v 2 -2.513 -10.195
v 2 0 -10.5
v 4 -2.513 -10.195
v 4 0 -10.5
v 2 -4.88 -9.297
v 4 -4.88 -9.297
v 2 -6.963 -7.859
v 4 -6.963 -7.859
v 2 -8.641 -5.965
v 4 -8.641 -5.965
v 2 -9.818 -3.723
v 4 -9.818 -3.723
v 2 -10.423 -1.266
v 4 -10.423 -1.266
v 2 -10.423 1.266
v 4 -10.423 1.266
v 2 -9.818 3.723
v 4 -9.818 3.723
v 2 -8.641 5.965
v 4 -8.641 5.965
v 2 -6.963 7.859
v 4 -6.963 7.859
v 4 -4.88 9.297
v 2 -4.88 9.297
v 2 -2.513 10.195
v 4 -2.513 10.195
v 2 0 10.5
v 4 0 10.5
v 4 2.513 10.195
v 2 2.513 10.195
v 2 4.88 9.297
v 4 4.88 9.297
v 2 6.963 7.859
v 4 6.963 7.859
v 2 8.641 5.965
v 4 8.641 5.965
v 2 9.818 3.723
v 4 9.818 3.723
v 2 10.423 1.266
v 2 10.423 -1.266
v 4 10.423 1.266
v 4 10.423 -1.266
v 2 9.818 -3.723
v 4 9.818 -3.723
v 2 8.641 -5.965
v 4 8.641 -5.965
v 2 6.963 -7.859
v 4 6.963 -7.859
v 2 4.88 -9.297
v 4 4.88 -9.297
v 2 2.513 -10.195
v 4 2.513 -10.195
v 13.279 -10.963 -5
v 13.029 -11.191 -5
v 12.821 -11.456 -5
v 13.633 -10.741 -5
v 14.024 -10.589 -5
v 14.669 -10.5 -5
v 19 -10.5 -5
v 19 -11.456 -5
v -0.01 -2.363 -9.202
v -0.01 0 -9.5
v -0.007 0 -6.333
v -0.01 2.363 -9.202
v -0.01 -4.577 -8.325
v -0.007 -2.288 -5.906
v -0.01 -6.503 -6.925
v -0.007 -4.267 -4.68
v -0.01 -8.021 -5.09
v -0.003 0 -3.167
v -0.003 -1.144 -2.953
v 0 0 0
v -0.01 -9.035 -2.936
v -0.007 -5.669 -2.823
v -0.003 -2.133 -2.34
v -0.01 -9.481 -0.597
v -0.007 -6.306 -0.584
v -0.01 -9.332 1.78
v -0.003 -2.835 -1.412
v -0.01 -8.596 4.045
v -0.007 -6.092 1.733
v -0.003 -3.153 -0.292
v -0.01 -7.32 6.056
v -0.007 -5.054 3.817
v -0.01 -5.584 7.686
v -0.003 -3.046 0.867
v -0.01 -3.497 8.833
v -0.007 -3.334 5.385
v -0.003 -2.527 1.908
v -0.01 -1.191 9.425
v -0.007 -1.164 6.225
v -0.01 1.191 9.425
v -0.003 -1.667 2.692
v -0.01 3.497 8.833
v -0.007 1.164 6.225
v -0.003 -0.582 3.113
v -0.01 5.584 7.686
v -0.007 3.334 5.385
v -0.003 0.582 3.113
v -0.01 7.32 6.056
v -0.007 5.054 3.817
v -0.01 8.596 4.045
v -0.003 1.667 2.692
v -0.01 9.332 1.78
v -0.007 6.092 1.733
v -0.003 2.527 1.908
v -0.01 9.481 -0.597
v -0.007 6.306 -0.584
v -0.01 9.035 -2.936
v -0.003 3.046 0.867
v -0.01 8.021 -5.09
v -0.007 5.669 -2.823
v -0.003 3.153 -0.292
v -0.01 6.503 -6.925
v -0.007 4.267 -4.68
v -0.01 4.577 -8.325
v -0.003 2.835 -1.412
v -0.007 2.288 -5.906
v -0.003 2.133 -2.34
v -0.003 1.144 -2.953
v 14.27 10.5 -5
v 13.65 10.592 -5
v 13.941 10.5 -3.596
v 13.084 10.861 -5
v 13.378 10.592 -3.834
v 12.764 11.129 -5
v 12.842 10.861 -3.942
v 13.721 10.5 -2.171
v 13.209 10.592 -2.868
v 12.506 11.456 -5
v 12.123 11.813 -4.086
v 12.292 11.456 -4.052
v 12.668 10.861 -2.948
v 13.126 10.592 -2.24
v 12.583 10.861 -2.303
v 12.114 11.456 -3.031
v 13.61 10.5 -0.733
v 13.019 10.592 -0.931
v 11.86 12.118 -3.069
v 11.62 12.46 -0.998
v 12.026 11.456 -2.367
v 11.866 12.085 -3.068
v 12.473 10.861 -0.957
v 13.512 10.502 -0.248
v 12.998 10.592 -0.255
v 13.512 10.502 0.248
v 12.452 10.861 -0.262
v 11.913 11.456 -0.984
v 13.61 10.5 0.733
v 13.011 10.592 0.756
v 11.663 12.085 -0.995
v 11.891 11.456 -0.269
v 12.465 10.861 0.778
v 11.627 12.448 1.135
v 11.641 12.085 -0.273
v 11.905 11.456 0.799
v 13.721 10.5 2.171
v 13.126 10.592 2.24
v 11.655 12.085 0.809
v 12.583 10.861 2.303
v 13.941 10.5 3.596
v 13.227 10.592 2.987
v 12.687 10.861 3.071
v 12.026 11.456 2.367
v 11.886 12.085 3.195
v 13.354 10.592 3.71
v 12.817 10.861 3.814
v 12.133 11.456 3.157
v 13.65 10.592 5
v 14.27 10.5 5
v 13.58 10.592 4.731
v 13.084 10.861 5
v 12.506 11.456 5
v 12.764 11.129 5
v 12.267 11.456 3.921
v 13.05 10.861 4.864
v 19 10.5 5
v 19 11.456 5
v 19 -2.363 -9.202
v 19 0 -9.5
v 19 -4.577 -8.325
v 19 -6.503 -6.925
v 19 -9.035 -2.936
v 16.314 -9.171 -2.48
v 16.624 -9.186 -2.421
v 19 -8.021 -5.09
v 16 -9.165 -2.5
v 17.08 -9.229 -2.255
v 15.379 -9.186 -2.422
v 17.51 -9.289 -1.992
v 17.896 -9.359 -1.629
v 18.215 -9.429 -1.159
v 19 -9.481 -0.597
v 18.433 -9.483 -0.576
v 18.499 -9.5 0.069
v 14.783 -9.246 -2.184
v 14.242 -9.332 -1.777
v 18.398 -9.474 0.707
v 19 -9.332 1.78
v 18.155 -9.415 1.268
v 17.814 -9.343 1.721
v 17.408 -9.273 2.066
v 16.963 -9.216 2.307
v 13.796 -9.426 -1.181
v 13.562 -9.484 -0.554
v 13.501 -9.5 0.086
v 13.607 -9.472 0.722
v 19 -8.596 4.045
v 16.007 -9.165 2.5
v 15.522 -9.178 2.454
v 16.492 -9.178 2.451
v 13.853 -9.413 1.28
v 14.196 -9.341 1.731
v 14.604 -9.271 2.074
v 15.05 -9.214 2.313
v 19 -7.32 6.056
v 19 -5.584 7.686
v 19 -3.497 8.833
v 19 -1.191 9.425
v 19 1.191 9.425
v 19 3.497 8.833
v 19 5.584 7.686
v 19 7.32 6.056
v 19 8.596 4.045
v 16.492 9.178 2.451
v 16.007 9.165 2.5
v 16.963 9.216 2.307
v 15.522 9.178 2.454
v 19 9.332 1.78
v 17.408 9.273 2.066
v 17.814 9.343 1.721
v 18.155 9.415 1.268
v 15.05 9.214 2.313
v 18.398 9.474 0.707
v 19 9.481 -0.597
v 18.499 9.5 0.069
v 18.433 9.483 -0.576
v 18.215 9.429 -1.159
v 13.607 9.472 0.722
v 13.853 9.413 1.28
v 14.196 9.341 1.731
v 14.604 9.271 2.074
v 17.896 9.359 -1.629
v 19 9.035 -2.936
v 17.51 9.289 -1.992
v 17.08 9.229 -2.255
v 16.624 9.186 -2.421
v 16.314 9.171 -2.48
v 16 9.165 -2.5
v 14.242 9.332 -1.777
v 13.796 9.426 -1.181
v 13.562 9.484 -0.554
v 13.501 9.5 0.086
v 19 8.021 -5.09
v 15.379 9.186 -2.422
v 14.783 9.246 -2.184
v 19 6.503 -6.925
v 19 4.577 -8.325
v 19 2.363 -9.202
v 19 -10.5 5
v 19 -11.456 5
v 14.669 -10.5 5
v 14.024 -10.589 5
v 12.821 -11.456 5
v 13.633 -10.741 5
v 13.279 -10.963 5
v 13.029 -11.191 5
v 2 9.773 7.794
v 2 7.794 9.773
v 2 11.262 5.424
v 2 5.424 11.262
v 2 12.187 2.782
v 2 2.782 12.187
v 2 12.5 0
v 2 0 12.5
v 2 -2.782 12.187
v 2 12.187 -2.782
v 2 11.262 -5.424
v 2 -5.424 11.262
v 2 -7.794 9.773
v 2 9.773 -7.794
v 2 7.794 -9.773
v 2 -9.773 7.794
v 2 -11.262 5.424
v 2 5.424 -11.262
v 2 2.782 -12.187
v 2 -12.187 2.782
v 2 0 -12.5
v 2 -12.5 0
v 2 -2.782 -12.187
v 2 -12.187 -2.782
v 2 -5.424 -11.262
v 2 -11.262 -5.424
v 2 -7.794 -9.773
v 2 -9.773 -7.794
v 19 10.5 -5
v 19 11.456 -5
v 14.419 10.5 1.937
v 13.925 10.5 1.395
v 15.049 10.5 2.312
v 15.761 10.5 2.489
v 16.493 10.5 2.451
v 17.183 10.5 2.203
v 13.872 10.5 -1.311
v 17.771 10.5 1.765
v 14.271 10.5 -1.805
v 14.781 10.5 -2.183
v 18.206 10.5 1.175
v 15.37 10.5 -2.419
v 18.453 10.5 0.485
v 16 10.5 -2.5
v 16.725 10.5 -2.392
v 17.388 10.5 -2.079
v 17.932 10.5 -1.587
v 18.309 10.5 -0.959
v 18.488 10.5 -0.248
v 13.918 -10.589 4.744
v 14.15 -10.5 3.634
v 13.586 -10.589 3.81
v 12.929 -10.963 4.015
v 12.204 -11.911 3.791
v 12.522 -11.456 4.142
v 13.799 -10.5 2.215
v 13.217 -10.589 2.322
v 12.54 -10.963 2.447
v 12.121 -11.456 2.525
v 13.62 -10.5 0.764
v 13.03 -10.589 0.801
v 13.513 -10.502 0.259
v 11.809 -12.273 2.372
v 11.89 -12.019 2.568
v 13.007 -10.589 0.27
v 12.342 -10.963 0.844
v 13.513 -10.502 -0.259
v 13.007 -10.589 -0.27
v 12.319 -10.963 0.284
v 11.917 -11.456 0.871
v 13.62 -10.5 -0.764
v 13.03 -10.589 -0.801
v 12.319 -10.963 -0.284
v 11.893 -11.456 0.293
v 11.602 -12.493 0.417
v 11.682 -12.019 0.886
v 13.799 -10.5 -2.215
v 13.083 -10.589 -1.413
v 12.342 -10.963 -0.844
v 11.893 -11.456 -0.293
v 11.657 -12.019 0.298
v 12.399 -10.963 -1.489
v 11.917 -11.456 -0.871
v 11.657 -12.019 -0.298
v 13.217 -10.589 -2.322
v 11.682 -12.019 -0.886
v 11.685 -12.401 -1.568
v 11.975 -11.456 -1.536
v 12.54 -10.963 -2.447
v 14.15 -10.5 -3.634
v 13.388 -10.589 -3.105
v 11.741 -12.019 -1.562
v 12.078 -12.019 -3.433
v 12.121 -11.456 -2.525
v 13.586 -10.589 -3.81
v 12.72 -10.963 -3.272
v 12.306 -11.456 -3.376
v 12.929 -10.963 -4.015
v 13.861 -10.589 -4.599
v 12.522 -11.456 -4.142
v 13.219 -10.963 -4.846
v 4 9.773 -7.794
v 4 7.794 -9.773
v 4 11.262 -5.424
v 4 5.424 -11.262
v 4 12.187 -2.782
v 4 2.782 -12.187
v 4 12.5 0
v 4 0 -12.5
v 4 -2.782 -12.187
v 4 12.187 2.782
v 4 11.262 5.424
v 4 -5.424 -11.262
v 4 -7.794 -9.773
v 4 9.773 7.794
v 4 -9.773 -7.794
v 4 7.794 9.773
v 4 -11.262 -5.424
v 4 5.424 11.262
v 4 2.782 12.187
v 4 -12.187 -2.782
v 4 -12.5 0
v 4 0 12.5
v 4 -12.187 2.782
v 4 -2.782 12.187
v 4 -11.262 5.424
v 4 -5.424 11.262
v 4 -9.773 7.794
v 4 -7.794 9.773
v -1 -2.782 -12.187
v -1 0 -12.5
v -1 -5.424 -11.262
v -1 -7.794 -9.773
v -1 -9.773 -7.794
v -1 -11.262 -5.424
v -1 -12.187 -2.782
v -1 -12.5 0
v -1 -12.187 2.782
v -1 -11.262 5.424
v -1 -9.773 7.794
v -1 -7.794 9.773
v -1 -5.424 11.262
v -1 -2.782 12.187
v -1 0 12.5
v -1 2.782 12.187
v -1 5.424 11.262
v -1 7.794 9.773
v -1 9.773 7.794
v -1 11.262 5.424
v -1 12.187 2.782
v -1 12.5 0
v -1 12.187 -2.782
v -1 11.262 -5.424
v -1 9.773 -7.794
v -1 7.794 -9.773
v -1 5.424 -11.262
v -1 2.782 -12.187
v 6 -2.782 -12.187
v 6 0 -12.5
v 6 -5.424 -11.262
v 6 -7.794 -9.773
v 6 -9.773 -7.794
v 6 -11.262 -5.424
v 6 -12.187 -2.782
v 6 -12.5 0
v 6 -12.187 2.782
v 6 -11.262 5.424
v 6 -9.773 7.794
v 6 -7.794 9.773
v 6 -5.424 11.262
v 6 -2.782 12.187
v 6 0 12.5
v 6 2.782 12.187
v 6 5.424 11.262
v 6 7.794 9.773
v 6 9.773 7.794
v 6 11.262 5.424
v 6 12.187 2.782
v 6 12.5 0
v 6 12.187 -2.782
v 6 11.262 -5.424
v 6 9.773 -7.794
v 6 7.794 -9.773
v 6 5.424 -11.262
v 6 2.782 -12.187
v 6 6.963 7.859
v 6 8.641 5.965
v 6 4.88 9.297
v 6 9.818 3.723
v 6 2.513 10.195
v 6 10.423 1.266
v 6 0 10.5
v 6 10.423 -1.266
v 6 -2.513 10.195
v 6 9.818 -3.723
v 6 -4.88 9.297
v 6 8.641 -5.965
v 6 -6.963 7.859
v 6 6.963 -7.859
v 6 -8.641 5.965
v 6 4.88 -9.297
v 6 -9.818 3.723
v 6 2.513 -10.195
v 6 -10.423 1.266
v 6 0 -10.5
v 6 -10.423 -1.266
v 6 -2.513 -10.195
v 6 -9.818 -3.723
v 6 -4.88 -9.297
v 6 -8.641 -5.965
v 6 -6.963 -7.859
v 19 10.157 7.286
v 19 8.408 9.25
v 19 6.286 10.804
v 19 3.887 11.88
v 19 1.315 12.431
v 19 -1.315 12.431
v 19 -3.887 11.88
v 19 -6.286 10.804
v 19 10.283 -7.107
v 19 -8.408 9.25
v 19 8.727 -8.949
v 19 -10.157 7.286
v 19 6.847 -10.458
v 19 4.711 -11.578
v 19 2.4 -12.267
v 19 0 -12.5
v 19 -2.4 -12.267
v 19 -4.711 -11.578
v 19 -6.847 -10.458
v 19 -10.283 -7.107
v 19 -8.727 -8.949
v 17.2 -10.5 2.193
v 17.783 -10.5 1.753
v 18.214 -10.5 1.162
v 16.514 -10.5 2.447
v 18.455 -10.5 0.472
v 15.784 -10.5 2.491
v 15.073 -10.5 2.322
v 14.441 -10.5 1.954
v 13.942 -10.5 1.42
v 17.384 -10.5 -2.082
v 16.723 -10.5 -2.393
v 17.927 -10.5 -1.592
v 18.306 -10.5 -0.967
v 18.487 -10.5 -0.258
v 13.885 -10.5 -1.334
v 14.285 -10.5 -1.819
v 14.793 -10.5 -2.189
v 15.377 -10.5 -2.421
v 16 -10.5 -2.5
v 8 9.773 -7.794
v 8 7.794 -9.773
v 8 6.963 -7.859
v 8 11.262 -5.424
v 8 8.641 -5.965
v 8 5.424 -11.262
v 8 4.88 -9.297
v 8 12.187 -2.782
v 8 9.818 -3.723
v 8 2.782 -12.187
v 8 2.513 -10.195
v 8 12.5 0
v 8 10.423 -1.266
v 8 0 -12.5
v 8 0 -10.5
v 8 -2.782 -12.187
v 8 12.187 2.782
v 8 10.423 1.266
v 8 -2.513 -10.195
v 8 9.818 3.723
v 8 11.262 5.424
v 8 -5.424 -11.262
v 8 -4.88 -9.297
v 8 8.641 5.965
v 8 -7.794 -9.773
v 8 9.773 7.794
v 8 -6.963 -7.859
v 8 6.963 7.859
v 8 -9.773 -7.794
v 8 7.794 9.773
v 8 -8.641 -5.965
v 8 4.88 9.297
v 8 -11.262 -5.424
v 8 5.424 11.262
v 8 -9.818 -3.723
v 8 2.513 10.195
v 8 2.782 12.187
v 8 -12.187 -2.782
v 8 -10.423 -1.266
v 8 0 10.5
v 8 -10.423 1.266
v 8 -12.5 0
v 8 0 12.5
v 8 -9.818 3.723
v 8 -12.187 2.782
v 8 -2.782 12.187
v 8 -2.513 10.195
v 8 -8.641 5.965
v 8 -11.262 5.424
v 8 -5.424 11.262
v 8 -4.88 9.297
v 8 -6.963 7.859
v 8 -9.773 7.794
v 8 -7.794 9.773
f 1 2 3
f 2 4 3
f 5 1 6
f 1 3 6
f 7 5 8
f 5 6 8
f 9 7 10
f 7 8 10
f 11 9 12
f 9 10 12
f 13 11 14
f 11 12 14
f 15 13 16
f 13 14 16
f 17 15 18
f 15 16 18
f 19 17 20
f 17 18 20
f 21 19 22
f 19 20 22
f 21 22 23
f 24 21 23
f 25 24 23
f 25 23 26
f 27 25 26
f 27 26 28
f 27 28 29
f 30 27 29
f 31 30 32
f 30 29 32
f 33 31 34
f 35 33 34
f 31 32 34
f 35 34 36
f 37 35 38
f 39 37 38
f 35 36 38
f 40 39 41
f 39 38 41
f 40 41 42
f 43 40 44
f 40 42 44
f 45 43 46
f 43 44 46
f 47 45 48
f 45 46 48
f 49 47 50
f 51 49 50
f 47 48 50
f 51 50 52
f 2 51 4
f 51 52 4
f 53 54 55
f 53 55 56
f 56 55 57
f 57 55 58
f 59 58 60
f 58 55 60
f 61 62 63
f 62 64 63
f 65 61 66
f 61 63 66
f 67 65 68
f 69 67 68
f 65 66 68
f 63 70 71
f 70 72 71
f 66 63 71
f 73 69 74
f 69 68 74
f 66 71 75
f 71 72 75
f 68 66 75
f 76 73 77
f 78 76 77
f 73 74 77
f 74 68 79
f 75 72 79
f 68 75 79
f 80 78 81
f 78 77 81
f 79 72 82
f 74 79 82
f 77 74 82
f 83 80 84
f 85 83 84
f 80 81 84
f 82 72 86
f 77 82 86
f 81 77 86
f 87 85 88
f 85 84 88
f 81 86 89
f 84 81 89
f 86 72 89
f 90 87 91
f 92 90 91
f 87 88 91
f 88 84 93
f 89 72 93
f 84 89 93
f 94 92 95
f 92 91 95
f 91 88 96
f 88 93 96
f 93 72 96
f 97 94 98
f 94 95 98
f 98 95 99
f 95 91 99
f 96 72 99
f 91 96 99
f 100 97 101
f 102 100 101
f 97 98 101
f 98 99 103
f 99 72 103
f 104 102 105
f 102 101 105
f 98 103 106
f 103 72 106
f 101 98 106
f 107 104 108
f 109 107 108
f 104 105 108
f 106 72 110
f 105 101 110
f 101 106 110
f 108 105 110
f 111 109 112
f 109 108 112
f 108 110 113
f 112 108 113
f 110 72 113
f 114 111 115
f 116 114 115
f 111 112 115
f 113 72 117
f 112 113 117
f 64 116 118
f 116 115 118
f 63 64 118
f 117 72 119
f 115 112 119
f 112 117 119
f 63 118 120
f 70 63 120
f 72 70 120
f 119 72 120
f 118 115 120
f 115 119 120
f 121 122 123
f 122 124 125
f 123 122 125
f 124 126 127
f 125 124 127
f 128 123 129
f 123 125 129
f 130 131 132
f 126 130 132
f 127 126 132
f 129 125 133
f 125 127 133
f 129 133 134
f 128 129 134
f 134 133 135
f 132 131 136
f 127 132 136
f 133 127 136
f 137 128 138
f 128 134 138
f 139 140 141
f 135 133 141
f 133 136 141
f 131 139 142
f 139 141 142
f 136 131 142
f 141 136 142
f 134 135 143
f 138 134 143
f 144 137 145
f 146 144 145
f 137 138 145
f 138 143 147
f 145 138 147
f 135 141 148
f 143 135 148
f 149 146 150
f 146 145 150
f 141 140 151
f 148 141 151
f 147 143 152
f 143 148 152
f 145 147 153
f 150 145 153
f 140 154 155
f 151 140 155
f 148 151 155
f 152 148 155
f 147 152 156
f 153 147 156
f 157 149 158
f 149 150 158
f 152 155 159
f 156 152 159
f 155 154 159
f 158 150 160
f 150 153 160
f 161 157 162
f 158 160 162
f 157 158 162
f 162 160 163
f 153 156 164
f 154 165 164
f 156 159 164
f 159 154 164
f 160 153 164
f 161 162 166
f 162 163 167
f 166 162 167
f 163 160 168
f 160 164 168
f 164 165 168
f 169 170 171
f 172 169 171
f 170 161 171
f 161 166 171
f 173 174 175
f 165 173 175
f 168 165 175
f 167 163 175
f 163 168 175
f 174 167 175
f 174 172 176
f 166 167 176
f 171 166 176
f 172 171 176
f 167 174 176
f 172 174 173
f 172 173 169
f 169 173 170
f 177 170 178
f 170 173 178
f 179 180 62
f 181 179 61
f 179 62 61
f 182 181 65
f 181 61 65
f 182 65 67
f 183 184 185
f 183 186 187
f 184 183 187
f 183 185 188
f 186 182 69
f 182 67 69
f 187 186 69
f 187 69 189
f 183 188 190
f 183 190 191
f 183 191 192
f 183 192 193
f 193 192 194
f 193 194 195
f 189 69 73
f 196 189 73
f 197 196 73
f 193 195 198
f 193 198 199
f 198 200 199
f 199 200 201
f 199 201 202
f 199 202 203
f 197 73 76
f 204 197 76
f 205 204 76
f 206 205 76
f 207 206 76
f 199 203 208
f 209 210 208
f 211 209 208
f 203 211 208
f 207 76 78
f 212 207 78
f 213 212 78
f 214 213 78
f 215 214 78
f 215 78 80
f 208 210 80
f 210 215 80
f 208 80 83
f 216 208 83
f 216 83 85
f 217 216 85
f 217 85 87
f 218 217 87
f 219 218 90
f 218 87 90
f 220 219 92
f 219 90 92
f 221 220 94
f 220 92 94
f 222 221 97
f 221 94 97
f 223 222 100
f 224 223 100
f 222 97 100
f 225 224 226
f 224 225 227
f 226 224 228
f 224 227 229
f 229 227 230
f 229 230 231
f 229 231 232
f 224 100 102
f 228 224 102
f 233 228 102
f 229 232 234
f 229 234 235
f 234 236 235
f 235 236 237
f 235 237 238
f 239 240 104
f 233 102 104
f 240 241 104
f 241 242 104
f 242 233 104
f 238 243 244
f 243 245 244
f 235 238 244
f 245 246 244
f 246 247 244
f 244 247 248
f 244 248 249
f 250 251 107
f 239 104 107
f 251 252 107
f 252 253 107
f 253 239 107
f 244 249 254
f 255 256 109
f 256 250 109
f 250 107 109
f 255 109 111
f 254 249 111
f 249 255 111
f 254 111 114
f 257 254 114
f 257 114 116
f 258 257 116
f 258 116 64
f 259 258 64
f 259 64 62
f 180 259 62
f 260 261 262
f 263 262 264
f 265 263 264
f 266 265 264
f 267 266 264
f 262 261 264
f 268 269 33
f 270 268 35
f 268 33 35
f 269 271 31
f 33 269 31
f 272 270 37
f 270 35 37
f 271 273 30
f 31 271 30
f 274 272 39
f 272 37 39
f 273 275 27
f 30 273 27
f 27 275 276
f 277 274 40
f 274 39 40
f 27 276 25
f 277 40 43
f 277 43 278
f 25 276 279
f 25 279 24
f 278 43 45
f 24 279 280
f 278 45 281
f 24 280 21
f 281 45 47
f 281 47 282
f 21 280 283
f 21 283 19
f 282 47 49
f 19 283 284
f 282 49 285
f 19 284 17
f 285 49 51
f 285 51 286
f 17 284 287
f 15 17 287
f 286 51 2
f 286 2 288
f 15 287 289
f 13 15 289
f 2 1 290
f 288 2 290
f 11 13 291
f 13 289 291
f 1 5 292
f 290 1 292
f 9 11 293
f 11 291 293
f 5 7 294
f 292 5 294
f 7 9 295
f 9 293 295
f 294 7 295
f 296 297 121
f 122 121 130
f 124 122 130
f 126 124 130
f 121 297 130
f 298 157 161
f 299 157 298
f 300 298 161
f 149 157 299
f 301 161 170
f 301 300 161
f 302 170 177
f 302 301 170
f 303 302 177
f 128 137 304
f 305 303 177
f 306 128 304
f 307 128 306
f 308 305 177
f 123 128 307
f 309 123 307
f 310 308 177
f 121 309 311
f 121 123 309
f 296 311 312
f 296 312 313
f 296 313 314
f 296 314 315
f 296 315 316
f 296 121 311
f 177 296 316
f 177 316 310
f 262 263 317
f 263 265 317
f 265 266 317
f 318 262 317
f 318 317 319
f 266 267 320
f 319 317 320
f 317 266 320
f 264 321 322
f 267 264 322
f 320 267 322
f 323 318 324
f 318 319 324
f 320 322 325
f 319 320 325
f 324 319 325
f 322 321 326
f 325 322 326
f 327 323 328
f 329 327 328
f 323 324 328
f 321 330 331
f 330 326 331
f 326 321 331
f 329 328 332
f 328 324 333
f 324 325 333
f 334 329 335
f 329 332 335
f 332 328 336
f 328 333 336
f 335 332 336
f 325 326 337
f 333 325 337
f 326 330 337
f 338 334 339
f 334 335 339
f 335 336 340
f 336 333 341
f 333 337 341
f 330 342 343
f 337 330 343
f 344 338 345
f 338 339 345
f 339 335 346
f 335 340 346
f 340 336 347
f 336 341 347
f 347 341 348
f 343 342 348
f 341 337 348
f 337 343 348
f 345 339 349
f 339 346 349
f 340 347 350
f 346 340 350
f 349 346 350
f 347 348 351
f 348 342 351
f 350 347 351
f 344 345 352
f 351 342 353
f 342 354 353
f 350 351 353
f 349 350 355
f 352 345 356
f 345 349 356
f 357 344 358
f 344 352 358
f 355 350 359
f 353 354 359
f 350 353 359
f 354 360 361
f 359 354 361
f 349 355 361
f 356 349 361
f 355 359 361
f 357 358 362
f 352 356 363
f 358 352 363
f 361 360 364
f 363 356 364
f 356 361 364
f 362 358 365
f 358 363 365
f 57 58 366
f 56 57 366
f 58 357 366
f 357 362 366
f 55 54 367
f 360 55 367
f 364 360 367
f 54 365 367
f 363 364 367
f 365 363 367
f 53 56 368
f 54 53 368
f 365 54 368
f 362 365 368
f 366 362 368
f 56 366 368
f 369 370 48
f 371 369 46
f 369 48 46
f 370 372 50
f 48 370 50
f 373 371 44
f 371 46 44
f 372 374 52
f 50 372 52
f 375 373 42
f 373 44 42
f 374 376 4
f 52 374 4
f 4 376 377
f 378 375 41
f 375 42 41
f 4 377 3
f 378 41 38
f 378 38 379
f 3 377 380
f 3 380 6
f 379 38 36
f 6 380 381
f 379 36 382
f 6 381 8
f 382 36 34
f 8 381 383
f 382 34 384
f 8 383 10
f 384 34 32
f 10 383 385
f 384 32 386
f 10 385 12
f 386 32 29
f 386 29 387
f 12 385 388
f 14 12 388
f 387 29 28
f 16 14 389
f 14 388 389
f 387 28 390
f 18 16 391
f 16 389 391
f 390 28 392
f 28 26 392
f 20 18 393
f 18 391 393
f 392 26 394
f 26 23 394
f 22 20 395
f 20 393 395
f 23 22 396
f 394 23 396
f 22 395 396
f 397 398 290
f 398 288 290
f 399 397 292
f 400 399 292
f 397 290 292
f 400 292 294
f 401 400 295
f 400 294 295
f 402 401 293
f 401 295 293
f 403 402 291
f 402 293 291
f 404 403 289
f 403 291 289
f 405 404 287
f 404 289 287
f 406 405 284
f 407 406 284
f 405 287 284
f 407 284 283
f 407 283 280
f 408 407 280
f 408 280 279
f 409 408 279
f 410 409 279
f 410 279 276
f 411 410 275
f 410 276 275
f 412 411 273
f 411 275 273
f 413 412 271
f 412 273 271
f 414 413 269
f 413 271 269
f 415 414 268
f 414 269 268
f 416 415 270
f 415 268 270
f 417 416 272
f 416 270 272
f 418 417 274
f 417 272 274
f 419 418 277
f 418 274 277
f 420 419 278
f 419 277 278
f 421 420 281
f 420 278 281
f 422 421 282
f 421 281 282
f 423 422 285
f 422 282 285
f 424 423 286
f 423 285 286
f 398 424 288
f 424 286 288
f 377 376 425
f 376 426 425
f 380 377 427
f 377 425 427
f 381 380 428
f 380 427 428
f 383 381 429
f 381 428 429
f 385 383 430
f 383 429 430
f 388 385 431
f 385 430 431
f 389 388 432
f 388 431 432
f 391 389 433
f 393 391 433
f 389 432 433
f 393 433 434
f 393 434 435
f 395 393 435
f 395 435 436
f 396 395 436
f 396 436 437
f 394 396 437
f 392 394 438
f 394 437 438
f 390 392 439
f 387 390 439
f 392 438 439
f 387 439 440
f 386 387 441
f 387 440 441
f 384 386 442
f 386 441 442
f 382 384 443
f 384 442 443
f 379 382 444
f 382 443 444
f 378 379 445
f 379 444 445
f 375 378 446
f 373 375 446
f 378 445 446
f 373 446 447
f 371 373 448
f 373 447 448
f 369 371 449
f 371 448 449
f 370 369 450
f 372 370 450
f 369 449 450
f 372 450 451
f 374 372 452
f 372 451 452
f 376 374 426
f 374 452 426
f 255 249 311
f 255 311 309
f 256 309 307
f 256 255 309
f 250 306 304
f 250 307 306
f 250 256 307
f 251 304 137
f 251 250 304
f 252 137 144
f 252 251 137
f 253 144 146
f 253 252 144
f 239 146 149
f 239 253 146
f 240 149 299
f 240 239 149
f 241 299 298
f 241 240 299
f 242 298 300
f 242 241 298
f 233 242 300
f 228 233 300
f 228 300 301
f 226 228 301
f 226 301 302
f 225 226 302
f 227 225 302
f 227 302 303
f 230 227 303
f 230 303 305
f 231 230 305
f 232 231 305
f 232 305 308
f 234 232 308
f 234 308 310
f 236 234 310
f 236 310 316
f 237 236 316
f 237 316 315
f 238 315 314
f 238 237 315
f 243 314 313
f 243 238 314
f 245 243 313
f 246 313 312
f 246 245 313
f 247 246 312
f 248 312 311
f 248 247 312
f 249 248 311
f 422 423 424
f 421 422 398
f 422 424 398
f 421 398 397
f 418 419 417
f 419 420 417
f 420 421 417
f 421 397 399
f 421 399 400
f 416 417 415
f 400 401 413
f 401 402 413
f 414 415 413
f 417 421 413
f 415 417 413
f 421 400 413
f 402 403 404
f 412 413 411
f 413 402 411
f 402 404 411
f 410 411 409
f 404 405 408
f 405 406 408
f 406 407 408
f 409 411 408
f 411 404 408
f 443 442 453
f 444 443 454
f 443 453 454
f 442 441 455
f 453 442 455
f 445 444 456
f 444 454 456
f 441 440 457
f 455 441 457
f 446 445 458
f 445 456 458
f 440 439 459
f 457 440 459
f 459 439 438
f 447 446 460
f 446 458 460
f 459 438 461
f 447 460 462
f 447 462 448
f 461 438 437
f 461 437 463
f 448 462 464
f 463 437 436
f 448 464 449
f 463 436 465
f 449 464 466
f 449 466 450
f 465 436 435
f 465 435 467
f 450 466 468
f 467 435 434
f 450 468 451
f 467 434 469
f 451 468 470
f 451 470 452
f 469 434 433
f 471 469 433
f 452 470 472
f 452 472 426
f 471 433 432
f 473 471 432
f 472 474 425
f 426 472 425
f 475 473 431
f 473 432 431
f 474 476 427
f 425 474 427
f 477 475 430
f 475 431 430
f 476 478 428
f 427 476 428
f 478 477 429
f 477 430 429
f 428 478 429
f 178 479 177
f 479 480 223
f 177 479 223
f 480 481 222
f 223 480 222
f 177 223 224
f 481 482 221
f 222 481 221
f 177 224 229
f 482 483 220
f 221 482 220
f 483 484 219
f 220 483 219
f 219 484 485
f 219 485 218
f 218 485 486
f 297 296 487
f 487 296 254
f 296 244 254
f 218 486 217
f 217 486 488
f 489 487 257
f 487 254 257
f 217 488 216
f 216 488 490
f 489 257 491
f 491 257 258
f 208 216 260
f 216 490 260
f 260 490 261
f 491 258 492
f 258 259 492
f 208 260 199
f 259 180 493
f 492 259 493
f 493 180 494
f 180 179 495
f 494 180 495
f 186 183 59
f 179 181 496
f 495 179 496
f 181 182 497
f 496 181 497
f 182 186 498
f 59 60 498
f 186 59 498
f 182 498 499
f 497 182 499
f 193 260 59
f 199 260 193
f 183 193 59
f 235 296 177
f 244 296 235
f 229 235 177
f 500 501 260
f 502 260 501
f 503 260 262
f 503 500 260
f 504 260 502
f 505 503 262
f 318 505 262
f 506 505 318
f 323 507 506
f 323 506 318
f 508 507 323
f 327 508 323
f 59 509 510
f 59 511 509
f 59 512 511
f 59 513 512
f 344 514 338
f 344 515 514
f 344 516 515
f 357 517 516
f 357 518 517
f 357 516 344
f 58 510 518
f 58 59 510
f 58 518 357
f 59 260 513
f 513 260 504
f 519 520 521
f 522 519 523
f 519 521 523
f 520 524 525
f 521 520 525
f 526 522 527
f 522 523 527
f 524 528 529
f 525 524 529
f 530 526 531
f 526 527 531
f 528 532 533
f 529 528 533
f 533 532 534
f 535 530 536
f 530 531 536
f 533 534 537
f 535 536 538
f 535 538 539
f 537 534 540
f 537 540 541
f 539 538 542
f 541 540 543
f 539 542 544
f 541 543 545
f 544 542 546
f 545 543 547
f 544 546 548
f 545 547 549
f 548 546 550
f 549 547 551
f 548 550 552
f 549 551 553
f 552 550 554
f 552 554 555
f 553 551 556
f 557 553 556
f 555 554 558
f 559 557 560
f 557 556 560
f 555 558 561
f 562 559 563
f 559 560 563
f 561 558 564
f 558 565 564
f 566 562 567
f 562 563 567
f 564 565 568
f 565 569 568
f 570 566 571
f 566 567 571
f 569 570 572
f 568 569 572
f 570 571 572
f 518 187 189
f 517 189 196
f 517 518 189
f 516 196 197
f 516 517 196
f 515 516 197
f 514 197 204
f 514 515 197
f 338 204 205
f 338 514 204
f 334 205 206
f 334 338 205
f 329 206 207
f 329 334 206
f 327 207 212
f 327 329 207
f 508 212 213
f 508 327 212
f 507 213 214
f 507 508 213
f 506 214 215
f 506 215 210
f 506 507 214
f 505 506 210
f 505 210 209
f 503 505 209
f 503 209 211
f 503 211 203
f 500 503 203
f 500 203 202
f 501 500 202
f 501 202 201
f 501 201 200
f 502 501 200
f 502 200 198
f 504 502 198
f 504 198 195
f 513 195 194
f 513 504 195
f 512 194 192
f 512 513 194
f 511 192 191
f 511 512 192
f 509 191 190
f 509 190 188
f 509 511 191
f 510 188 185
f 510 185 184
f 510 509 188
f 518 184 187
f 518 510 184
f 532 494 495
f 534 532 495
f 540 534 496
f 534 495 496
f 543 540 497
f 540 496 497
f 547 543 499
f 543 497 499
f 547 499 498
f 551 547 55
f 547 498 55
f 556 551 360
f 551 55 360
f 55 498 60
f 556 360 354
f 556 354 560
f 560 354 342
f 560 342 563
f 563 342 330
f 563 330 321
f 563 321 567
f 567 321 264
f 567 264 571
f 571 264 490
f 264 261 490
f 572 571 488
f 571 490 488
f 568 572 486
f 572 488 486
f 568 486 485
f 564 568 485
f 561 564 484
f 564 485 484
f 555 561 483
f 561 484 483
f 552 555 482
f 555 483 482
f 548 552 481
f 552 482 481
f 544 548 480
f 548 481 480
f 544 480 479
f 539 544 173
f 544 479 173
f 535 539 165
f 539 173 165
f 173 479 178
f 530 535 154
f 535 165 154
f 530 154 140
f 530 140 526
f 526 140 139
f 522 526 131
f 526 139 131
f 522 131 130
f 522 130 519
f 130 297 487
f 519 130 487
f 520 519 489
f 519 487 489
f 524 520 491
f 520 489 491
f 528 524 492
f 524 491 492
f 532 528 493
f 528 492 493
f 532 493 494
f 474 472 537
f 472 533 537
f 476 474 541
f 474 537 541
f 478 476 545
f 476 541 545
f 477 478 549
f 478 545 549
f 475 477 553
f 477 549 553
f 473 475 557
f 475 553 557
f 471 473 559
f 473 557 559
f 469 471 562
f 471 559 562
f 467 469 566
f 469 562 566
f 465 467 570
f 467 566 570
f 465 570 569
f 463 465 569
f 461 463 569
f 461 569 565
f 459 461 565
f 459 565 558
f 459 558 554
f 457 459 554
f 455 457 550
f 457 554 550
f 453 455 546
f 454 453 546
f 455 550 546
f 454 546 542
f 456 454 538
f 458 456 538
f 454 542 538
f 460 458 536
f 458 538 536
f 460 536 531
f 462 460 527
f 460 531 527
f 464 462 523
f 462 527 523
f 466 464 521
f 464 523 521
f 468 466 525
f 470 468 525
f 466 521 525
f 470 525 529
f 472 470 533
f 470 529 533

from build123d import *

# Parameters (mm, degrees)
CUT_EXTRUDE2_DEPTH = 2
FILLET1_R          = 2
CUT_EXTRUDE3_DEPTH = 2
FILLET2_R          = 2
SKETCH7_R          = 2.5
CUT_EXTRUDE4_DEPTH = 34.797190672


with BuildPart() as part:
    # Sketch1 → Revolve1 (revolve)
    with BuildSketch(Plane.XY, mode=Mode.PRIVATE) as revolve1_sk:
        Polygon((0, 0), (-1, 0), (-1, 12.5), (2, 12.5), (2, 10.5), (4, 10.5), (4, 12.5), (6, 12.5), (6, 10.5), (8, 10.5), (8, 12.5), (19, 12.5), (19, 9.5), (-0.010152284, 9.5), align=None)
    revolve(revolve1_sk.sketch.rotate(Axis((0, 0, 0), (-1, 0, 0)), 90), axis=Axis((0, 0, 0), (-1, 0, 0)))

    # Sketch4 → Cut-Extrude2 (cut)
    with BuildSketch(Plane(origin=(0, 12.5, 0), x_dir=(1, 0, 0), z_dir=(0, 1, 0))):
        with BuildLine():
            Line((21.034766018, -5), (21.034766018, 5))
            Line((21.034766018, 5), (12.203400087, 5))
            ThreePointArc((12.203400087, 5), (11.59564841, 0), (12.203400087, -5))
            Line((12.203400087, -5), (21.034766018, -5))
        make_face()
    extrude(amount=-CUT_EXTRUDE2_DEPTH, mode=Mode.SUBTRACT)

    # Fillet1
    # the kernel refuses this fillet: 2 mm, written as the material it adds along each edge
    with BuildSketch(Plane(origin=(32.467135125, 10.5, 0), x_dir=(-0.8863085047711677, 0, -0.46309527569421044), z_dir=(0.46309527569421044, 0, -0.8863085047711677))) as fillet1_piece_1_section:
        with BuildLine():
            CenterArc((20.871486715 - FILLET1_R, FILLET1_R), FILLET1_R, 270, 90)
            Line((20.871486715, FILLET1_R), (20.871486715, 0))
            Line((20.871486715, 0), (20.871486715 - FILLET1_R, 0))
        make_face()
    fillet1_piece_1 = revolve(axis=Axis((32.467135125, 10.5, 0), (0, 1, 0)), revolution_arc=55.174042112, mode=Mode.PRIVATE)
    fillet1_piece_1 = fillet1_piece_1 & Plane(origin=(12.25218062, 0, 0), x_dir=(0, 0, -1), z_dir=(1, 0, 0)) * Cylinder(12.5, 84, mode=Mode.PRIVATE)
    add(fillet1_piece_1)

    # Sketch6 → Cut-Extrude3 (cut)
    with BuildSketch(Plane(origin=(0, -12.5, 0), x_dir=(1, 0, 0), z_dir=(0, 1, 0))):
        with BuildLine():
            Line((19, -5), (12.506184944, -5))
            ThreePointArc((12.506184944, -5), (11.59564841, 0), (12.506184944, 5))
            Line((12.506184944, 5), (19, 5))
            Line((19, 5), (19, -5))
        make_face()
    extrude(amount=CUT_EXTRUDE3_DEPTH, mode=Mode.SUBTRACT)

    # Fillet2
    # the kernel refuses this fillet: 2 mm, written as the material it adds along each edge
    with BuildSketch(Plane(origin=(25.779086317, -10.5, 0), x_dir=(-0.7565204646440288, 0, 0.6539700196299391), z_dir=(0.6539700196299391, 0, 0.7565204646440288))) as fillet2_piece_1_section:
        with BuildLine():
            CenterArc((14.183437907 - FILLET2_R, FILLET2_R), FILLET2_R, 270, 90)
            Line((14.183437907, FILLET2_R), (14.183437907, 0))
            Line((14.183437907, 0), (14.183437907 - FILLET2_R, 0))
        make_face()
    fillet2_piece_1 = revolve(axis=Axis((25.779086317, -10.5, 0), (0, -1, 0)), revolution_arc=81.683194908, mode=Mode.PRIVATE)
    fillet2_piece_1 = fillet2_piece_1 & Plane(origin=(12.166922866, 0, 0), x_dir=(0, 0, -1), z_dir=(1, 0, 0)) * Cylinder(12.5, 57, mode=Mode.PRIVATE)
    add(fillet2_piece_1)

    # Sketch7 → Cut-Extrude4 (cut, through all)
    with BuildSketch(Plane(origin=(0, -12.5, 0), x_dir=(1, 0, 0), z_dir=(0, 1, 0))):
        with Locations(Location((16, 0, 0), (0, 0, 90))):
            Circle(SKETCH7_R)
    extrude(amount=CUT_EXTRUDE4_DEPTH, mode=Mode.SUBTRACT)


solid = part.part
